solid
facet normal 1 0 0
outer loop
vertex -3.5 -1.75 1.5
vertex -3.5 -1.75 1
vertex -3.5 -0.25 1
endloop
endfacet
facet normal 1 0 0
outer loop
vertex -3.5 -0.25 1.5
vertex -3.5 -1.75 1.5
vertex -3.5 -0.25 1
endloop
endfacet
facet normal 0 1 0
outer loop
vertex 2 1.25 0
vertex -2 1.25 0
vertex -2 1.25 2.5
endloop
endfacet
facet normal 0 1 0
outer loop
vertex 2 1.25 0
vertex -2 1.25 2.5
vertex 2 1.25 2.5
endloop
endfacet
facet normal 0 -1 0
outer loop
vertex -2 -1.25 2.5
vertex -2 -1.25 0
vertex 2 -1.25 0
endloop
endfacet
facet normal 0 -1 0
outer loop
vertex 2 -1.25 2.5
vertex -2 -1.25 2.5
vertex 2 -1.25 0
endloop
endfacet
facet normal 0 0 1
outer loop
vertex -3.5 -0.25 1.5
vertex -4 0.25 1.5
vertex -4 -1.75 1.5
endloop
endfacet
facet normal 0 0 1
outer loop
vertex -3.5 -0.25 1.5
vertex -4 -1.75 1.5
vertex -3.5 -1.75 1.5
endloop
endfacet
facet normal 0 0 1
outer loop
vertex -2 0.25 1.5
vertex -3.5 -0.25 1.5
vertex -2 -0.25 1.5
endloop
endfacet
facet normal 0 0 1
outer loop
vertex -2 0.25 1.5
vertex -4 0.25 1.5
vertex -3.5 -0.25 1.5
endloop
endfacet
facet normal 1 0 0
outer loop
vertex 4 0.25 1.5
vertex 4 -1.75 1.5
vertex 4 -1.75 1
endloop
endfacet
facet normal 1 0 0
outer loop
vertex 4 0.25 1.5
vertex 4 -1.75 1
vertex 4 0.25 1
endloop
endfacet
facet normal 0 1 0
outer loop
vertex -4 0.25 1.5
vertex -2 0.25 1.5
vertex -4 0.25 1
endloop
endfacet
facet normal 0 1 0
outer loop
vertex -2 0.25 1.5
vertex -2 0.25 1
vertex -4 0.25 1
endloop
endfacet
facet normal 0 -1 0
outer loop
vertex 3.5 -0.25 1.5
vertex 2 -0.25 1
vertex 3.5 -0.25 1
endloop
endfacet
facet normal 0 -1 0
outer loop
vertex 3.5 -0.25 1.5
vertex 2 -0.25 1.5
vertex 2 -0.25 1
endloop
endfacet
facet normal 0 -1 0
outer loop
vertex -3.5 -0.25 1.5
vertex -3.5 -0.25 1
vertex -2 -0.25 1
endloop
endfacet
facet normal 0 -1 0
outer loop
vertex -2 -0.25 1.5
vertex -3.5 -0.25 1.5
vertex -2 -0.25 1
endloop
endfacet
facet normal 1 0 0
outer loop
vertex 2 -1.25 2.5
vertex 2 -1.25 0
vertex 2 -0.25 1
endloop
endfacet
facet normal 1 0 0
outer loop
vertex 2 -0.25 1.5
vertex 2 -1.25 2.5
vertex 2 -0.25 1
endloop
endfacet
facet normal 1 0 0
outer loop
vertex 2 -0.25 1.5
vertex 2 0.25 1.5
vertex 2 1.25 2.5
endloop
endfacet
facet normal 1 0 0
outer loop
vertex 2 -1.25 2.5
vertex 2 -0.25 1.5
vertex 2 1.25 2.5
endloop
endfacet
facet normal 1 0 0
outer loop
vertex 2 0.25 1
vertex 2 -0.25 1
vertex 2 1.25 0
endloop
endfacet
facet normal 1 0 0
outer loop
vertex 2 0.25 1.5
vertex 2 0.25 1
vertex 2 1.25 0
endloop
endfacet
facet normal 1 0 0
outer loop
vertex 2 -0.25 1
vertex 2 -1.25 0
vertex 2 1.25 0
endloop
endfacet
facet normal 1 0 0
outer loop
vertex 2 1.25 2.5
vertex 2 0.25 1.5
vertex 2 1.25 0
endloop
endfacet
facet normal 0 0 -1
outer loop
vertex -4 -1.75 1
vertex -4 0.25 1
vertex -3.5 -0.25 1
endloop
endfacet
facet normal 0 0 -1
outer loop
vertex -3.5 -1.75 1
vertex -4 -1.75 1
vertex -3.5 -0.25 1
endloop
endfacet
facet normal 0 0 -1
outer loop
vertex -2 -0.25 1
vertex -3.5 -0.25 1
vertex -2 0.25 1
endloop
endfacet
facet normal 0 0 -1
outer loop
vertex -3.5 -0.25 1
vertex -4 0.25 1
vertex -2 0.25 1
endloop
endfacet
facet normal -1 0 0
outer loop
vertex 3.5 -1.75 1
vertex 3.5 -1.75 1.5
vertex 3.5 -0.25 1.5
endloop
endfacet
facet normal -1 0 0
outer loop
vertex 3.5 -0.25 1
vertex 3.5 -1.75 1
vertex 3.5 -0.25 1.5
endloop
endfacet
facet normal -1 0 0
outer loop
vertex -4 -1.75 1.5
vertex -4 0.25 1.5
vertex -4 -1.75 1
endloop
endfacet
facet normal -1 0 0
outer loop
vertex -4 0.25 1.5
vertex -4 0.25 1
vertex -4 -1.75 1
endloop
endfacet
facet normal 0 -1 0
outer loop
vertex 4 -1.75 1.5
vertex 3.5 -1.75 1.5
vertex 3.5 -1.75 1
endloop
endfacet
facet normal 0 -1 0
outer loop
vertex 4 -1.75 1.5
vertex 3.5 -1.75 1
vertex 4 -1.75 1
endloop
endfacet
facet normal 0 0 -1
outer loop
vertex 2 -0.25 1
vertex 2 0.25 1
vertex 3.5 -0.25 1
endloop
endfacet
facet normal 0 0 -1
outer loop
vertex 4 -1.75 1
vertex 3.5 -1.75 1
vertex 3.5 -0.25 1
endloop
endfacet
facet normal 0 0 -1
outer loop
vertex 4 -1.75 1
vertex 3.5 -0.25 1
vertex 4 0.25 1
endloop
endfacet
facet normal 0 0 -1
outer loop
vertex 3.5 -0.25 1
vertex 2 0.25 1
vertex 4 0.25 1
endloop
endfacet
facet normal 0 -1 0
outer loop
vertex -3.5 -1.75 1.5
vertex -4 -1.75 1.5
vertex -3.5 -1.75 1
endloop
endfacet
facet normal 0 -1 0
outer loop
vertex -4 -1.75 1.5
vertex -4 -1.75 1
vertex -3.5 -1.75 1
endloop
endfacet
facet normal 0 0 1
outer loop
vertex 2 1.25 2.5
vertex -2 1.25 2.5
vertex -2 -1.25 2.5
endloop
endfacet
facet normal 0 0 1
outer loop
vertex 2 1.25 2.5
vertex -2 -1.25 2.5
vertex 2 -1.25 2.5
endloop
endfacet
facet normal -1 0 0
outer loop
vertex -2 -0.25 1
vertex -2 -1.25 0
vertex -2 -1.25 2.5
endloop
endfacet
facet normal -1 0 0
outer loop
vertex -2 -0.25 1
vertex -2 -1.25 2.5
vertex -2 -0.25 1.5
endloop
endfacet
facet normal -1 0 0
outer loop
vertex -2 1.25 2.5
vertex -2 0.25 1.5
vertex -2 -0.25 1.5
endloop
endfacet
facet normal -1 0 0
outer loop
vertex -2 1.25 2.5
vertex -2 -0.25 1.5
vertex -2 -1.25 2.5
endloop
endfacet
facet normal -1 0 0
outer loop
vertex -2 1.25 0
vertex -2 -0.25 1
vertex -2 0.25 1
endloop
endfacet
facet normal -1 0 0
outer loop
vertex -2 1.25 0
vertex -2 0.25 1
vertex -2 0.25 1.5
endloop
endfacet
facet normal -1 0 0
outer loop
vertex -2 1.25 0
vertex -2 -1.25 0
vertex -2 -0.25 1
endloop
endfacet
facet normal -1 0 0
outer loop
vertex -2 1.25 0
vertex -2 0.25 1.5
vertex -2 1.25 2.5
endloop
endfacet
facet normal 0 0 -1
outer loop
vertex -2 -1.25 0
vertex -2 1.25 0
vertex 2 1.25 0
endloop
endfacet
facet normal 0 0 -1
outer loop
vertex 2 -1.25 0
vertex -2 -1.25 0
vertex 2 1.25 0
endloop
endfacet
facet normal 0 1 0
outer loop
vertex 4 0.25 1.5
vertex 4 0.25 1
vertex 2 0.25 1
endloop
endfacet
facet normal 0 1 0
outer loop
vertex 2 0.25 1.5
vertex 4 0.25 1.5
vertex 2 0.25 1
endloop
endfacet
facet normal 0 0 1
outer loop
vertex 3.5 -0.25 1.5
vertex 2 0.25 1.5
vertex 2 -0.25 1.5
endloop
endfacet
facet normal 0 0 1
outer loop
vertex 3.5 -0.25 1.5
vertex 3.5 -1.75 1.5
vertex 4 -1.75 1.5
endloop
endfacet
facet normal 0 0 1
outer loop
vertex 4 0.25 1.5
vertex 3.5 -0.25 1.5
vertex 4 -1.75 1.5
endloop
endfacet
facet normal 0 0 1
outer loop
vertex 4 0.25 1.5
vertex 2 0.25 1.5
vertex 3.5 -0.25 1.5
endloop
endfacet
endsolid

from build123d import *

# Parameters (mm, degrees)
SKETCH3_W                = 4
SKETCH3_H                = 2.5
BOSS_EXTRUDE1_DEPTH      = 2.5
SKETCH6_W                = 1.5
SKETCH6_H                = 0.5
SKETCH6_W_2              = 0.5
SKETCH6_H_2              = 1.5
BOSS_EXTRUDE2_DEPTH      = 0.25
BOSS_EXTRUDE2_DEPTH_BACK = 0.25


with BuildPart() as part:
    # Sketch3 → Boss-Extrude1 (new body)
    with BuildSketch(Plane.XY):
        Rectangle(SKETCH3_W, SKETCH3_H)
    extrude(amount=BOSS_EXTRUDE1_DEPTH)

    # Sketch6 → Boss-Extrude2 (add, two sides)
    with BuildSketch(Plane.XY.offset(1.25)) as boss_extrude2_sk:
        with Locations((2.75, 0)):
            Rectangle(SKETCH6_W, SKETCH6_H)
        with Locations((3.75, 0)):
            Rectangle(SKETCH6_W_2, SKETCH6_H)
        with Locations((3.75, -1)):
            Rectangle(SKETCH6_W_2, SKETCH6_H_2)
        with Locations((-2.75, 0)):
            Rectangle(SKETCH6_W, SKETCH6_H)
        with Locations((-3.75, 0)):
            Rectangle(SKETCH6_W_2, SKETCH6_H)
        with Locations((-3.75, -1)):
            Rectangle(SKETCH6_W_2, SKETCH6_H_2)
    extrude(amount=BOSS_EXTRUDE2_DEPTH)
    extrude(boss_extrude2_sk.sketch, amount=-BOSS_EXTRUDE2_DEPTH_BACK)


solid = part.part
